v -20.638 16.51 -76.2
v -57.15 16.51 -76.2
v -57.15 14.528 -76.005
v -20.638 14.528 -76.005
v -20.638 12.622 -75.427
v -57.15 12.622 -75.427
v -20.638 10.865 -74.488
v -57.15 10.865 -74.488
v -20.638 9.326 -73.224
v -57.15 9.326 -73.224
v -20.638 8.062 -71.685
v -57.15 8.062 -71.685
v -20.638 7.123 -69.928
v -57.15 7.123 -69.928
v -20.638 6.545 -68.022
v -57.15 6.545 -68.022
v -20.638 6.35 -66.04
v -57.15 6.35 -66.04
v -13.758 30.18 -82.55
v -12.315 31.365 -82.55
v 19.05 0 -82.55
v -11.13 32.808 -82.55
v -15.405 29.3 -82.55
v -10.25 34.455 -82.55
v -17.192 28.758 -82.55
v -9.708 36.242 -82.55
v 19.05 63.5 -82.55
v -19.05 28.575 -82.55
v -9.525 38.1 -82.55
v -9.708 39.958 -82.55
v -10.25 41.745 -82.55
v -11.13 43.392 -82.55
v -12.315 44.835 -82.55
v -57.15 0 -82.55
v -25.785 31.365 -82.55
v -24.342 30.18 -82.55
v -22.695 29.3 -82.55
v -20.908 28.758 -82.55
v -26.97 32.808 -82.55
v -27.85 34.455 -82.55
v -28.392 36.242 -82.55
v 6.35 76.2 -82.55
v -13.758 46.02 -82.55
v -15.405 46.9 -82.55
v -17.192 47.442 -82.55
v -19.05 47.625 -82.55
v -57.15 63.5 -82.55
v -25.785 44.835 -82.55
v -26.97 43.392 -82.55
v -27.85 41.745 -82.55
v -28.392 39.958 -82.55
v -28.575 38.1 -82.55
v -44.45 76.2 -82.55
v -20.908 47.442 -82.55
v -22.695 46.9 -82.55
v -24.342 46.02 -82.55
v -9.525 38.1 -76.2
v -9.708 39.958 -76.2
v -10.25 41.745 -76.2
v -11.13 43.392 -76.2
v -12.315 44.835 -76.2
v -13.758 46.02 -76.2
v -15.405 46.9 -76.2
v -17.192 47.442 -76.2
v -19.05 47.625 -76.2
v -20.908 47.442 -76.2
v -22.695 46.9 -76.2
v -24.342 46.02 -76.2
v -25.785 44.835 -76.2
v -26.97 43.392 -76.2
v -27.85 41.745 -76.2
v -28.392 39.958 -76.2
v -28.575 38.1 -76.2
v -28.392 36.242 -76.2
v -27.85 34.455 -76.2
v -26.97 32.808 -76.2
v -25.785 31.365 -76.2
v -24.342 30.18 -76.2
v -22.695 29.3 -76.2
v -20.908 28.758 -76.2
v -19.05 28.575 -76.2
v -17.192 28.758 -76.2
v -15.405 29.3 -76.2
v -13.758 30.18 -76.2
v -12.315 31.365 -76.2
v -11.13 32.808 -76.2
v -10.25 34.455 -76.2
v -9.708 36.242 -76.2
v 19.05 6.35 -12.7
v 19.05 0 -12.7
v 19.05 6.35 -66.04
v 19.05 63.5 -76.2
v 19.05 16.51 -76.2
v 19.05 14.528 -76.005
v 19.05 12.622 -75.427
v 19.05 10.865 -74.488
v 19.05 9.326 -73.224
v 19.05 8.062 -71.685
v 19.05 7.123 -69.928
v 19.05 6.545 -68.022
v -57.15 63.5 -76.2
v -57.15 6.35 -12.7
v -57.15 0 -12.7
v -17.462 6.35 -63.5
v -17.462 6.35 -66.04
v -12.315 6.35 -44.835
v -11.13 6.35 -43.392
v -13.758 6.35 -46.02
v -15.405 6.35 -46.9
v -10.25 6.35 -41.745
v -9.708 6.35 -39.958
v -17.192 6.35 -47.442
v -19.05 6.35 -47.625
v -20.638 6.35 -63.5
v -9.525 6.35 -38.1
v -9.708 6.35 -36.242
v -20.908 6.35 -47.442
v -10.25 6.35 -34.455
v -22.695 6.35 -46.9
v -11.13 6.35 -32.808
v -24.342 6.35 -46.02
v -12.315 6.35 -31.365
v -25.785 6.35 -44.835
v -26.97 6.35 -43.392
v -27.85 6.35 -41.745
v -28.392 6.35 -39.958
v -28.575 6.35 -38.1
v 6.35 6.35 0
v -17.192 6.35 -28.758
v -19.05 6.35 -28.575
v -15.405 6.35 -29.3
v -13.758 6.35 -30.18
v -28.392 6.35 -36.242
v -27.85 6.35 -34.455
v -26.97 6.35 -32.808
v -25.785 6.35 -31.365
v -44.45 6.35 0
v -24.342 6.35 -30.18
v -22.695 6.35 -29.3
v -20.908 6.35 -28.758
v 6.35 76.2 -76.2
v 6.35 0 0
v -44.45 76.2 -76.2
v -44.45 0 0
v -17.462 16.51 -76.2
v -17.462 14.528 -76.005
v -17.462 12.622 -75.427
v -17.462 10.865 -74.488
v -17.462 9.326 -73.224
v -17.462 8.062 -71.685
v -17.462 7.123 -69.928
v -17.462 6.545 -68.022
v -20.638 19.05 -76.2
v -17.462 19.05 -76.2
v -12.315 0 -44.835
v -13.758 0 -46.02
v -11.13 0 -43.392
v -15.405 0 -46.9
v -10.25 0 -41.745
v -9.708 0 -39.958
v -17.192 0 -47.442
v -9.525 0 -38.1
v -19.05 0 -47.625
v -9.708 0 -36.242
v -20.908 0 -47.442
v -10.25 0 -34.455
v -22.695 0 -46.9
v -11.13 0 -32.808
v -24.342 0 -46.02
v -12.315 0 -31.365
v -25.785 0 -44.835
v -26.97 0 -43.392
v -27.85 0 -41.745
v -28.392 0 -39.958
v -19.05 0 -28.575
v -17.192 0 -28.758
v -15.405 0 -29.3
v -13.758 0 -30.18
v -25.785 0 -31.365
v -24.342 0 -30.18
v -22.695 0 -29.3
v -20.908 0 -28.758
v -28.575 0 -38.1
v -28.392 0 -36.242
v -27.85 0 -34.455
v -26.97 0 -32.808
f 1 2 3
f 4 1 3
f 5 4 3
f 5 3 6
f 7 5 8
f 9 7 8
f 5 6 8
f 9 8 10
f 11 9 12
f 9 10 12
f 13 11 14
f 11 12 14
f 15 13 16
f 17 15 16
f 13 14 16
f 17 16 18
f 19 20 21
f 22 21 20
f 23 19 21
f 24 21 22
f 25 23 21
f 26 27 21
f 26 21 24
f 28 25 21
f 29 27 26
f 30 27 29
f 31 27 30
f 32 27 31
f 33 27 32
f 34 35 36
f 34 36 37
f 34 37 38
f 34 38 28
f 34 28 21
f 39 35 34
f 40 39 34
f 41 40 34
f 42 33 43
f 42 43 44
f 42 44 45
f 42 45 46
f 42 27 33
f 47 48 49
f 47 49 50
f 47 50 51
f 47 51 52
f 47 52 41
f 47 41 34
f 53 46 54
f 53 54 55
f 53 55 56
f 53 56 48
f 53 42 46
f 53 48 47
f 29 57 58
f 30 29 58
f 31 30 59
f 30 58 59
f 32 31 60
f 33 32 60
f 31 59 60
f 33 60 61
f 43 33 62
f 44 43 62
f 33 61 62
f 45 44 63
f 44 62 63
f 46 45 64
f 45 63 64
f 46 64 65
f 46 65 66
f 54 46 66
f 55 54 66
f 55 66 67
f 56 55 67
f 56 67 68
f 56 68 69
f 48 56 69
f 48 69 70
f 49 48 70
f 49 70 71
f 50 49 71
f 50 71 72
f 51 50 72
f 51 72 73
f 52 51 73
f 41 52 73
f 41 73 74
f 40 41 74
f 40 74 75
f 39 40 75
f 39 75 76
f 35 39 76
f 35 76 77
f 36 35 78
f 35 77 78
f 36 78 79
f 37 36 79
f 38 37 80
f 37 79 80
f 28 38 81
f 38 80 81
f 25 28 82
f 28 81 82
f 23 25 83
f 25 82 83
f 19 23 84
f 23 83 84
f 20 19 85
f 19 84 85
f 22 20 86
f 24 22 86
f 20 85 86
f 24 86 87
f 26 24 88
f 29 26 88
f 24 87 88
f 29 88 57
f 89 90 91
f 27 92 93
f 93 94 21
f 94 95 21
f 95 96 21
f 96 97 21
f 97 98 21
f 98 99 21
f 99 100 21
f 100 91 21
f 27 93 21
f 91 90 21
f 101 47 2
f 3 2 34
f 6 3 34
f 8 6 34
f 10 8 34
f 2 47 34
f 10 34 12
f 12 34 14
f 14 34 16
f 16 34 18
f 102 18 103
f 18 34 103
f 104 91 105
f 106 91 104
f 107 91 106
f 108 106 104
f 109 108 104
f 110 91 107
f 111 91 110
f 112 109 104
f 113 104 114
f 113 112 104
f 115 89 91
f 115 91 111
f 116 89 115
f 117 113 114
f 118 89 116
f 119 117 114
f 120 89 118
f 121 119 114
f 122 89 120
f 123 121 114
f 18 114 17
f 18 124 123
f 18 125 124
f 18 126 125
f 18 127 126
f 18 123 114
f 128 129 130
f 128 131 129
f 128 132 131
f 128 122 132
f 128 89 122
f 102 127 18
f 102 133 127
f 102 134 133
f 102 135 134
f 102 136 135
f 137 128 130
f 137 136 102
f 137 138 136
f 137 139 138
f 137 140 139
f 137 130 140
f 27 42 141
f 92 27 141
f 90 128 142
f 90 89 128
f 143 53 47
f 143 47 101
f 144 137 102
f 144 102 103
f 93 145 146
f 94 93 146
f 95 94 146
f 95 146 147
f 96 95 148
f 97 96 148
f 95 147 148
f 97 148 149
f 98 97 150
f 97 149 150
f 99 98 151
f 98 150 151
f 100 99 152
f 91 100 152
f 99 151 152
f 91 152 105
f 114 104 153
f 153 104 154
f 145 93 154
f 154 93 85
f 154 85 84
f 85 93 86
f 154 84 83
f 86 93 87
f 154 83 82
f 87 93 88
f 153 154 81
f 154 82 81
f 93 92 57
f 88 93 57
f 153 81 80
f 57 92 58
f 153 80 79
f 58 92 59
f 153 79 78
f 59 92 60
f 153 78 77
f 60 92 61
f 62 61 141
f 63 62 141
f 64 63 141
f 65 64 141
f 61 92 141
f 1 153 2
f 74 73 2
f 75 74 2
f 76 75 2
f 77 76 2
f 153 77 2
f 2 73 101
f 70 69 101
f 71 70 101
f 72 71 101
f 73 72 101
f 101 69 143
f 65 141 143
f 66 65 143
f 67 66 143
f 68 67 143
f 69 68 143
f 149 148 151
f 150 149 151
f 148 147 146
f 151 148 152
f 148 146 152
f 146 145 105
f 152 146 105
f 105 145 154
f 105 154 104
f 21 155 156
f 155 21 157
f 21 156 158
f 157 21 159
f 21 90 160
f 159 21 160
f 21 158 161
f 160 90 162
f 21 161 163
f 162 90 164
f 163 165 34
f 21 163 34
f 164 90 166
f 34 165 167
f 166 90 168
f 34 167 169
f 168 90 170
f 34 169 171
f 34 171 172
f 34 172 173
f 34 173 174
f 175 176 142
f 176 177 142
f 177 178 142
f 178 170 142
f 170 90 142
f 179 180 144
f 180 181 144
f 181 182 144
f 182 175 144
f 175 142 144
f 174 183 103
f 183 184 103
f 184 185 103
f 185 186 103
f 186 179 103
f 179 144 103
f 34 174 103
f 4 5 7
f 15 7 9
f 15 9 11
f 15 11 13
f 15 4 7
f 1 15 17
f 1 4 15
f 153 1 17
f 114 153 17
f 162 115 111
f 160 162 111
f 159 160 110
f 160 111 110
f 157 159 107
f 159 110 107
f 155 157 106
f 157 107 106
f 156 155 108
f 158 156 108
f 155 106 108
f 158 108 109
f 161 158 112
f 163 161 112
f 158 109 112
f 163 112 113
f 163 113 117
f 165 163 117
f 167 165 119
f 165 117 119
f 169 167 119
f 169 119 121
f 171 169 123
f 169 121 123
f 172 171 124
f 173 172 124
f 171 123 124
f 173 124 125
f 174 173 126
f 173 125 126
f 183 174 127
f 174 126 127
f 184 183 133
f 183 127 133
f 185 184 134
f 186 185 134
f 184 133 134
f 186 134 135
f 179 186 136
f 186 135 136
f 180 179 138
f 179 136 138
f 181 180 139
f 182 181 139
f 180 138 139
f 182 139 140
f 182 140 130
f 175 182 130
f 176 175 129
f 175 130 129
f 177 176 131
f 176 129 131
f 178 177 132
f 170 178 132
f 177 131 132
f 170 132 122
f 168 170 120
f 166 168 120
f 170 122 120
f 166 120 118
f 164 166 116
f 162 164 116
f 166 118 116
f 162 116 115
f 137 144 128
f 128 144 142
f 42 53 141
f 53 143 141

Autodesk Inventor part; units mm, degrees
ref_plane "YZ Plane" through (0, 0, 0) normal (1, 0, 0) x (0, 1, 0)
ref_plane "XZ Plane" through (0, 0, 0) normal (0, 1, 0) x (-1, 0, 0)
sketch "Sketch1" plane through (0, 0, 0) normal (0, 1, 0) x (-1, 0, 0)
  line L0 (57.15, 0) -> (-19.05, 0)
  line L1 (-19.05, 0) -> (-19.05, -76.2)
  line L2 (-19.05, -76.2) -> (57.15, -76.2)
  line L3 (57.15, -76.2) -> (57.15, 0)
  point P0 (0, 0)
  dimension "d0" = 76.2
  dimension "d1" = 76.2
extrude "BOTTOM" add sketch "Sketch1" along normal blind 6.35
sketch "Sketch2" plane through (19.05, 0, -76.2) normal (0, 0, -1) x (-1, 0, 0)
  line L0 (0, 0) -> (76.2, 0)
  line L1 (76.2, 0) -> (76.2, 76.2)
  line L2 (76.2, 76.2) -> (0, 76.2)
  line L3 (0, 76.2) -> (0, 0)
  point P0 (19.05, 0)
  dimension "d4" = 76.2
  dimension "d5" = 76.2
extrude "SIDE" add sketch "Sketch2" along normal blind 6.35
sketch "Sketch3" plane through (0, 6.35, 0) normal (0, 1, 0) x (1, 0, 0)
  circle A0 centre (-19.05, 38.1) radius 9.525
  line L0 (-57.15, 76.2) -> (19.05, 76.2) projected
  line L1 (-57.15, 76.2) -> (-57.15, 0) projected
  point P0 (0, 0)
  point P1 (-44.45, 76.2)
  point P2 (6.35, 76.2)
  point P3 (-57.15, 12.7)
  dimension "d9" = 19.05
  dimension "d10" = 38.1
  dimension "d11" = 38.1
extrude "HOLE BOTT" cut sketch "Sketch3" against normal blind 6.35
sketch "Sketch4" plane through (19.05, 0, -76.2) normal (0, 0, 1) x (1, 0, 0)
  circle A0 centre (-38.1, 38.1) radius 9.525
  line L0 (-76.2, 76.2) -> (0, 76.2) projected
  line L1 (0, 76.2) -> (0, 6.35) projected
  point P0 (-19.05, 0)
  point P1 (-63.5, 76.2)
  point P2 (-12.7, 76.2)
  point P3 (0, 63.5)
  dimension "d14" = 19.05
  dimension "d15" = 38.1
  dimension "d16" = 38.1
extrude "HOLE SIDE" cut sketch "Sketch4" against normal blind 6.35
chamfer "CHM TOP" distance 12.7 angle 45 2 edges at (19.05, 76.2, -79.375) (-57.15, 76.2, -79.375)
ref_plane "Work Plane1" through (-19.05, 6.35, -76.2) normal (-1, 0, 0) x (0, 0, 1)
sketch "Sketch6" plane through (-19.05, 6.35, -76.2) normal (-1, 0, 0) x (0, 0, 1)
  line L0 (0, 0) -> (12.7, 0)
  line L1 (12.7, 0) -> (0, 12.7)
  line L2 (0, 12.7) -> (0, 0)
  point P0 (76.2, -6.35)
  dimension "d25" = 12.7
  dimension "d27" = 12.7
extrude "BRACE" add sketch "Sketch6" along normal mid plane 3.175
fillet "Fillet1" radius 10.16 2 edges at (-38.8937, 6.35, -76.2) (0.7938, 6.35, -76.2)
chamfer "CHM BOTT" distance 12.7 angle 45 2 edges at (-57.15, 3.175, 0) (19.05, 3.175, 0)
equation "\"d0\" = L"
equation "\"d1\" = w"
equation "\"d2\" = HT"
equation "\"d4\" = w"
equation "\"d5\" = L"
equation "\"d6\" = HT"
equation "\"d9\" = HL"
equation "\"d10\" = 0.5 * L"
equation "\"d11\" = 0.5 * w"
equation "\"d12\" = HT"
equation "\"d14\" = HL"
equation "\"d15\" = 0.5 * L"
equation "\"d16\" = 0.5 * w"
equation "\"d17\" = HT"
equation "\"d19\" = CHM"
equation "\"d28\" = 0.5 * HT"
equation "\"d31\" = CHM"
equation "\"d30\" = FL"
equation "\"L\" = 76.2"
equation "\"w\" = 76.2"
equation "\"HT\" = 6.35"
equation "\"CHM\" = 12.7"
equation "\"HL\" = 19.05"
equation "\"d24\" = -0.5 * w"
equation "\"FL\" = 10.16"
properties part number "PARAMETRIC L-BRAKET"
